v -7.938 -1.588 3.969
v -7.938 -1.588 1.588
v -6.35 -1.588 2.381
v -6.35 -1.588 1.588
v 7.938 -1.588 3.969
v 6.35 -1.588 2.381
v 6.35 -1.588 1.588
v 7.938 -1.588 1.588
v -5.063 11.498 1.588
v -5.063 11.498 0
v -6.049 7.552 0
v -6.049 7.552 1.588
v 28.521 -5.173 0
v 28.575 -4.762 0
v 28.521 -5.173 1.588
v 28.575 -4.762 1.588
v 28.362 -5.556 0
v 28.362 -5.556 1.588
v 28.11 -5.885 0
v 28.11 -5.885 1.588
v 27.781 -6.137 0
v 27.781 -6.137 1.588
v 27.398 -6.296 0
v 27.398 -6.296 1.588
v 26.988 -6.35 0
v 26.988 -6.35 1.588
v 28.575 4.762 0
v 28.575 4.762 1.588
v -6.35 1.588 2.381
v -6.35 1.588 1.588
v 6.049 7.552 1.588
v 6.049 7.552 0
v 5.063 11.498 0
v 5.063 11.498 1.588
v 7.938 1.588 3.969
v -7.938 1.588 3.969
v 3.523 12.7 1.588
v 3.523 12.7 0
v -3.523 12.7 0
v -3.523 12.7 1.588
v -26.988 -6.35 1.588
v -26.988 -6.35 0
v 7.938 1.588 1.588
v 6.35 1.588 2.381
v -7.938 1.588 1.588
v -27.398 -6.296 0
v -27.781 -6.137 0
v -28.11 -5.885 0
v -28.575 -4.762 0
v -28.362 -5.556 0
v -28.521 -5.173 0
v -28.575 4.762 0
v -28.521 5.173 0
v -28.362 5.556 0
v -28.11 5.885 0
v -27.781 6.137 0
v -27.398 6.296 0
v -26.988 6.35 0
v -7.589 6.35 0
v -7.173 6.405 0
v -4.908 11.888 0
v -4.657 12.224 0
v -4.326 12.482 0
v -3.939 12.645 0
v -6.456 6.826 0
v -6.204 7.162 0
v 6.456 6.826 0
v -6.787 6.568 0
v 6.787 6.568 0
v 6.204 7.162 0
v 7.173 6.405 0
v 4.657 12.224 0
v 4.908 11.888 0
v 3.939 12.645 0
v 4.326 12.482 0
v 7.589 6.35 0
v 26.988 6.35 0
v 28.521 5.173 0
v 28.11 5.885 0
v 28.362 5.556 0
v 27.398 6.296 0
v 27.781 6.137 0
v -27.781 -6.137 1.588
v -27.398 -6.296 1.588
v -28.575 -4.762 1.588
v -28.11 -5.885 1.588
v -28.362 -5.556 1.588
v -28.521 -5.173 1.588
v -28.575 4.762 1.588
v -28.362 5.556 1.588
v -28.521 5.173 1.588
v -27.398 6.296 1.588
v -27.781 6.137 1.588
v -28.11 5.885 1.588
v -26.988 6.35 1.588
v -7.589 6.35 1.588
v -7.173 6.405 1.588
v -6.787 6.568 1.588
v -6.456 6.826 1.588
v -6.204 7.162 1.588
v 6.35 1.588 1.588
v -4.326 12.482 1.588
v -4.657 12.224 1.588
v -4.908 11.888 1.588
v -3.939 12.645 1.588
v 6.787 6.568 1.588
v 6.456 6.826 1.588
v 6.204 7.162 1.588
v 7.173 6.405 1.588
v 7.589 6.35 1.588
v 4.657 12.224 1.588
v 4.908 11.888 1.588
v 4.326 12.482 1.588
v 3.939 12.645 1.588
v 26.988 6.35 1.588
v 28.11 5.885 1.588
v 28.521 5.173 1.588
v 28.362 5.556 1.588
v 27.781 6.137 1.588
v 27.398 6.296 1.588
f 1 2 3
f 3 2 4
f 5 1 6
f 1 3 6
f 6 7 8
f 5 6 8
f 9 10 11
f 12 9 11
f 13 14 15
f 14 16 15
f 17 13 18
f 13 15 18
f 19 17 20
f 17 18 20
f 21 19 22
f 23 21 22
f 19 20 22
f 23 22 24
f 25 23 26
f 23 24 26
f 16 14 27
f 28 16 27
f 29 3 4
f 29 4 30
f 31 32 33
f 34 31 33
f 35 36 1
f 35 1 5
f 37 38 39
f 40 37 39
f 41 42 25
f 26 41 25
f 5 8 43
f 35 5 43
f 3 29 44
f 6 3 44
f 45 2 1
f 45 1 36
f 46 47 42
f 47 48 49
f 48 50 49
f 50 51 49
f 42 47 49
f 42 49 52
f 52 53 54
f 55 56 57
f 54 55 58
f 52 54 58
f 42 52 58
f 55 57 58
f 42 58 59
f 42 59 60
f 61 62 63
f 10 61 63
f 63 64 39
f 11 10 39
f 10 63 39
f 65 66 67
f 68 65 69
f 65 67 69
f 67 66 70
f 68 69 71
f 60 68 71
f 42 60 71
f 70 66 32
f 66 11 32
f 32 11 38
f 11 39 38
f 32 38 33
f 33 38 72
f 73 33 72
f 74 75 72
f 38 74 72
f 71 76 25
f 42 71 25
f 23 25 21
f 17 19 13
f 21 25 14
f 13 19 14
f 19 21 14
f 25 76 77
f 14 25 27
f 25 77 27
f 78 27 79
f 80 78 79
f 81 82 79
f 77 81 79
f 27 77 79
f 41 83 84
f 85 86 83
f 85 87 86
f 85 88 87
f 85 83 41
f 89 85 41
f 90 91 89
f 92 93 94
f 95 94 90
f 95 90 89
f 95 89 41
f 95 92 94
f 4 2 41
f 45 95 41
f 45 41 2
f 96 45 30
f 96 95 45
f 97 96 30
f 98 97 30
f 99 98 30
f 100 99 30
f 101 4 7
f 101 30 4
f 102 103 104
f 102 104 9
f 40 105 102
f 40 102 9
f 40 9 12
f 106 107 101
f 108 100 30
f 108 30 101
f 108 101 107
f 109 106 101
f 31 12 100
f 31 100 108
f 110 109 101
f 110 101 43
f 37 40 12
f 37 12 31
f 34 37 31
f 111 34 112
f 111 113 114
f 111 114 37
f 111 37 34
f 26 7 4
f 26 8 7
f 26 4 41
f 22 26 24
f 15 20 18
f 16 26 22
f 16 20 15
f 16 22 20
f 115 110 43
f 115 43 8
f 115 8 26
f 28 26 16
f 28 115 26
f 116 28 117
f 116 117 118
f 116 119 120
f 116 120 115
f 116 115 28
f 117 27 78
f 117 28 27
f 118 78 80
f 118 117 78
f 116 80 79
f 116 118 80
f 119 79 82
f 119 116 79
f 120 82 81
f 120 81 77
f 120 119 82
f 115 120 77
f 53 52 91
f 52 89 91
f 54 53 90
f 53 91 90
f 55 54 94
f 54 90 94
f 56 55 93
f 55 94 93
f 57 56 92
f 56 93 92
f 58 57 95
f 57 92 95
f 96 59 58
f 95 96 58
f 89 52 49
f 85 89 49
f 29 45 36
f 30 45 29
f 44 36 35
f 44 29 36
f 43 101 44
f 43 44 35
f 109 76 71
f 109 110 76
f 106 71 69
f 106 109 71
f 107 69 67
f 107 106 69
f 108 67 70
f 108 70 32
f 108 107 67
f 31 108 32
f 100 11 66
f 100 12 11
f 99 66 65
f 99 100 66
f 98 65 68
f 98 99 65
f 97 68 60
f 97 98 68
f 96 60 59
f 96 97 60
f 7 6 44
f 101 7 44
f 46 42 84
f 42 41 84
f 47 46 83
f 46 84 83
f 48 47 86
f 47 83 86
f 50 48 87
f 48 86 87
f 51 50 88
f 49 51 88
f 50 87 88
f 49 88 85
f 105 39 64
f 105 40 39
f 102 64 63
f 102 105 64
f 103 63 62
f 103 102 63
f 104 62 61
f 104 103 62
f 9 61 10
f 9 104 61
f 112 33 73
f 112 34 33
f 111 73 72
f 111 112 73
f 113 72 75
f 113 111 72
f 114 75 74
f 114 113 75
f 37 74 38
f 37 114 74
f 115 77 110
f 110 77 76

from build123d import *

# Parameters (mm, degrees)
F1_DEPTH = 1.5875
F2_W     = 15.875
F2_H     = 3.175
F3_DEPTH = 2.38125
F5_W     = 12.7
F5_H     = 3.175
F6_DEPTH = 0.79375
F7_R     = 1.5875


# Not quite as in the source:
# - a feature of the source that left no trace in its solid (it failed there, or was rolled back) is left out


with BuildPart() as f1:
    # F0 (on Top) → F1 (new body)
    with BuildSketch(Plane.XY):
        Polygon((28.575, -6.35), (28.575, 6.35), (6.35, 6.35), (4.7625, 12.7), (-4.7625, 12.7), (-6.35, 6.35), (-28.575, 6.35), (-28.575, -6.35), align=None)
    extrude(amount=F1_DEPTH)

    # F2 (on face) → F3 (join)
    with BuildSketch(Plane.XY.offset(1.5875)):
        Rectangle(F2_W, F2_H)
    extrude(amount=F3_DEPTH)

    # F5 (on offset) → F6 (cut)
    with BuildSketch(Plane.XY.offset(2.38125)):
        Rectangle(F5_W, F5_H)
    extrude(amount=-F6_DEPTH, mode=Mode.SUBTRACT)

    # F7
    f7_edges = [f1.edges().sort_by_distance(p)[0] for p in [
        (-28.575, -6.35, 0.79375),
        (28.575, -6.35, 0.79375),
        (28.575, 6.35, 0.79375),
        (4.7625, 12.7, 0.79375),
        (-28.575, 6.35, 0.79375),
        (-4.7625, 12.7, 0.79375),
        (-6.35, 6.35, 0.79375),
        (6.35, 6.35, 0.79375),
    ]]
    fillet(f7_edges, radius=F7_R)


solid = f1.part
